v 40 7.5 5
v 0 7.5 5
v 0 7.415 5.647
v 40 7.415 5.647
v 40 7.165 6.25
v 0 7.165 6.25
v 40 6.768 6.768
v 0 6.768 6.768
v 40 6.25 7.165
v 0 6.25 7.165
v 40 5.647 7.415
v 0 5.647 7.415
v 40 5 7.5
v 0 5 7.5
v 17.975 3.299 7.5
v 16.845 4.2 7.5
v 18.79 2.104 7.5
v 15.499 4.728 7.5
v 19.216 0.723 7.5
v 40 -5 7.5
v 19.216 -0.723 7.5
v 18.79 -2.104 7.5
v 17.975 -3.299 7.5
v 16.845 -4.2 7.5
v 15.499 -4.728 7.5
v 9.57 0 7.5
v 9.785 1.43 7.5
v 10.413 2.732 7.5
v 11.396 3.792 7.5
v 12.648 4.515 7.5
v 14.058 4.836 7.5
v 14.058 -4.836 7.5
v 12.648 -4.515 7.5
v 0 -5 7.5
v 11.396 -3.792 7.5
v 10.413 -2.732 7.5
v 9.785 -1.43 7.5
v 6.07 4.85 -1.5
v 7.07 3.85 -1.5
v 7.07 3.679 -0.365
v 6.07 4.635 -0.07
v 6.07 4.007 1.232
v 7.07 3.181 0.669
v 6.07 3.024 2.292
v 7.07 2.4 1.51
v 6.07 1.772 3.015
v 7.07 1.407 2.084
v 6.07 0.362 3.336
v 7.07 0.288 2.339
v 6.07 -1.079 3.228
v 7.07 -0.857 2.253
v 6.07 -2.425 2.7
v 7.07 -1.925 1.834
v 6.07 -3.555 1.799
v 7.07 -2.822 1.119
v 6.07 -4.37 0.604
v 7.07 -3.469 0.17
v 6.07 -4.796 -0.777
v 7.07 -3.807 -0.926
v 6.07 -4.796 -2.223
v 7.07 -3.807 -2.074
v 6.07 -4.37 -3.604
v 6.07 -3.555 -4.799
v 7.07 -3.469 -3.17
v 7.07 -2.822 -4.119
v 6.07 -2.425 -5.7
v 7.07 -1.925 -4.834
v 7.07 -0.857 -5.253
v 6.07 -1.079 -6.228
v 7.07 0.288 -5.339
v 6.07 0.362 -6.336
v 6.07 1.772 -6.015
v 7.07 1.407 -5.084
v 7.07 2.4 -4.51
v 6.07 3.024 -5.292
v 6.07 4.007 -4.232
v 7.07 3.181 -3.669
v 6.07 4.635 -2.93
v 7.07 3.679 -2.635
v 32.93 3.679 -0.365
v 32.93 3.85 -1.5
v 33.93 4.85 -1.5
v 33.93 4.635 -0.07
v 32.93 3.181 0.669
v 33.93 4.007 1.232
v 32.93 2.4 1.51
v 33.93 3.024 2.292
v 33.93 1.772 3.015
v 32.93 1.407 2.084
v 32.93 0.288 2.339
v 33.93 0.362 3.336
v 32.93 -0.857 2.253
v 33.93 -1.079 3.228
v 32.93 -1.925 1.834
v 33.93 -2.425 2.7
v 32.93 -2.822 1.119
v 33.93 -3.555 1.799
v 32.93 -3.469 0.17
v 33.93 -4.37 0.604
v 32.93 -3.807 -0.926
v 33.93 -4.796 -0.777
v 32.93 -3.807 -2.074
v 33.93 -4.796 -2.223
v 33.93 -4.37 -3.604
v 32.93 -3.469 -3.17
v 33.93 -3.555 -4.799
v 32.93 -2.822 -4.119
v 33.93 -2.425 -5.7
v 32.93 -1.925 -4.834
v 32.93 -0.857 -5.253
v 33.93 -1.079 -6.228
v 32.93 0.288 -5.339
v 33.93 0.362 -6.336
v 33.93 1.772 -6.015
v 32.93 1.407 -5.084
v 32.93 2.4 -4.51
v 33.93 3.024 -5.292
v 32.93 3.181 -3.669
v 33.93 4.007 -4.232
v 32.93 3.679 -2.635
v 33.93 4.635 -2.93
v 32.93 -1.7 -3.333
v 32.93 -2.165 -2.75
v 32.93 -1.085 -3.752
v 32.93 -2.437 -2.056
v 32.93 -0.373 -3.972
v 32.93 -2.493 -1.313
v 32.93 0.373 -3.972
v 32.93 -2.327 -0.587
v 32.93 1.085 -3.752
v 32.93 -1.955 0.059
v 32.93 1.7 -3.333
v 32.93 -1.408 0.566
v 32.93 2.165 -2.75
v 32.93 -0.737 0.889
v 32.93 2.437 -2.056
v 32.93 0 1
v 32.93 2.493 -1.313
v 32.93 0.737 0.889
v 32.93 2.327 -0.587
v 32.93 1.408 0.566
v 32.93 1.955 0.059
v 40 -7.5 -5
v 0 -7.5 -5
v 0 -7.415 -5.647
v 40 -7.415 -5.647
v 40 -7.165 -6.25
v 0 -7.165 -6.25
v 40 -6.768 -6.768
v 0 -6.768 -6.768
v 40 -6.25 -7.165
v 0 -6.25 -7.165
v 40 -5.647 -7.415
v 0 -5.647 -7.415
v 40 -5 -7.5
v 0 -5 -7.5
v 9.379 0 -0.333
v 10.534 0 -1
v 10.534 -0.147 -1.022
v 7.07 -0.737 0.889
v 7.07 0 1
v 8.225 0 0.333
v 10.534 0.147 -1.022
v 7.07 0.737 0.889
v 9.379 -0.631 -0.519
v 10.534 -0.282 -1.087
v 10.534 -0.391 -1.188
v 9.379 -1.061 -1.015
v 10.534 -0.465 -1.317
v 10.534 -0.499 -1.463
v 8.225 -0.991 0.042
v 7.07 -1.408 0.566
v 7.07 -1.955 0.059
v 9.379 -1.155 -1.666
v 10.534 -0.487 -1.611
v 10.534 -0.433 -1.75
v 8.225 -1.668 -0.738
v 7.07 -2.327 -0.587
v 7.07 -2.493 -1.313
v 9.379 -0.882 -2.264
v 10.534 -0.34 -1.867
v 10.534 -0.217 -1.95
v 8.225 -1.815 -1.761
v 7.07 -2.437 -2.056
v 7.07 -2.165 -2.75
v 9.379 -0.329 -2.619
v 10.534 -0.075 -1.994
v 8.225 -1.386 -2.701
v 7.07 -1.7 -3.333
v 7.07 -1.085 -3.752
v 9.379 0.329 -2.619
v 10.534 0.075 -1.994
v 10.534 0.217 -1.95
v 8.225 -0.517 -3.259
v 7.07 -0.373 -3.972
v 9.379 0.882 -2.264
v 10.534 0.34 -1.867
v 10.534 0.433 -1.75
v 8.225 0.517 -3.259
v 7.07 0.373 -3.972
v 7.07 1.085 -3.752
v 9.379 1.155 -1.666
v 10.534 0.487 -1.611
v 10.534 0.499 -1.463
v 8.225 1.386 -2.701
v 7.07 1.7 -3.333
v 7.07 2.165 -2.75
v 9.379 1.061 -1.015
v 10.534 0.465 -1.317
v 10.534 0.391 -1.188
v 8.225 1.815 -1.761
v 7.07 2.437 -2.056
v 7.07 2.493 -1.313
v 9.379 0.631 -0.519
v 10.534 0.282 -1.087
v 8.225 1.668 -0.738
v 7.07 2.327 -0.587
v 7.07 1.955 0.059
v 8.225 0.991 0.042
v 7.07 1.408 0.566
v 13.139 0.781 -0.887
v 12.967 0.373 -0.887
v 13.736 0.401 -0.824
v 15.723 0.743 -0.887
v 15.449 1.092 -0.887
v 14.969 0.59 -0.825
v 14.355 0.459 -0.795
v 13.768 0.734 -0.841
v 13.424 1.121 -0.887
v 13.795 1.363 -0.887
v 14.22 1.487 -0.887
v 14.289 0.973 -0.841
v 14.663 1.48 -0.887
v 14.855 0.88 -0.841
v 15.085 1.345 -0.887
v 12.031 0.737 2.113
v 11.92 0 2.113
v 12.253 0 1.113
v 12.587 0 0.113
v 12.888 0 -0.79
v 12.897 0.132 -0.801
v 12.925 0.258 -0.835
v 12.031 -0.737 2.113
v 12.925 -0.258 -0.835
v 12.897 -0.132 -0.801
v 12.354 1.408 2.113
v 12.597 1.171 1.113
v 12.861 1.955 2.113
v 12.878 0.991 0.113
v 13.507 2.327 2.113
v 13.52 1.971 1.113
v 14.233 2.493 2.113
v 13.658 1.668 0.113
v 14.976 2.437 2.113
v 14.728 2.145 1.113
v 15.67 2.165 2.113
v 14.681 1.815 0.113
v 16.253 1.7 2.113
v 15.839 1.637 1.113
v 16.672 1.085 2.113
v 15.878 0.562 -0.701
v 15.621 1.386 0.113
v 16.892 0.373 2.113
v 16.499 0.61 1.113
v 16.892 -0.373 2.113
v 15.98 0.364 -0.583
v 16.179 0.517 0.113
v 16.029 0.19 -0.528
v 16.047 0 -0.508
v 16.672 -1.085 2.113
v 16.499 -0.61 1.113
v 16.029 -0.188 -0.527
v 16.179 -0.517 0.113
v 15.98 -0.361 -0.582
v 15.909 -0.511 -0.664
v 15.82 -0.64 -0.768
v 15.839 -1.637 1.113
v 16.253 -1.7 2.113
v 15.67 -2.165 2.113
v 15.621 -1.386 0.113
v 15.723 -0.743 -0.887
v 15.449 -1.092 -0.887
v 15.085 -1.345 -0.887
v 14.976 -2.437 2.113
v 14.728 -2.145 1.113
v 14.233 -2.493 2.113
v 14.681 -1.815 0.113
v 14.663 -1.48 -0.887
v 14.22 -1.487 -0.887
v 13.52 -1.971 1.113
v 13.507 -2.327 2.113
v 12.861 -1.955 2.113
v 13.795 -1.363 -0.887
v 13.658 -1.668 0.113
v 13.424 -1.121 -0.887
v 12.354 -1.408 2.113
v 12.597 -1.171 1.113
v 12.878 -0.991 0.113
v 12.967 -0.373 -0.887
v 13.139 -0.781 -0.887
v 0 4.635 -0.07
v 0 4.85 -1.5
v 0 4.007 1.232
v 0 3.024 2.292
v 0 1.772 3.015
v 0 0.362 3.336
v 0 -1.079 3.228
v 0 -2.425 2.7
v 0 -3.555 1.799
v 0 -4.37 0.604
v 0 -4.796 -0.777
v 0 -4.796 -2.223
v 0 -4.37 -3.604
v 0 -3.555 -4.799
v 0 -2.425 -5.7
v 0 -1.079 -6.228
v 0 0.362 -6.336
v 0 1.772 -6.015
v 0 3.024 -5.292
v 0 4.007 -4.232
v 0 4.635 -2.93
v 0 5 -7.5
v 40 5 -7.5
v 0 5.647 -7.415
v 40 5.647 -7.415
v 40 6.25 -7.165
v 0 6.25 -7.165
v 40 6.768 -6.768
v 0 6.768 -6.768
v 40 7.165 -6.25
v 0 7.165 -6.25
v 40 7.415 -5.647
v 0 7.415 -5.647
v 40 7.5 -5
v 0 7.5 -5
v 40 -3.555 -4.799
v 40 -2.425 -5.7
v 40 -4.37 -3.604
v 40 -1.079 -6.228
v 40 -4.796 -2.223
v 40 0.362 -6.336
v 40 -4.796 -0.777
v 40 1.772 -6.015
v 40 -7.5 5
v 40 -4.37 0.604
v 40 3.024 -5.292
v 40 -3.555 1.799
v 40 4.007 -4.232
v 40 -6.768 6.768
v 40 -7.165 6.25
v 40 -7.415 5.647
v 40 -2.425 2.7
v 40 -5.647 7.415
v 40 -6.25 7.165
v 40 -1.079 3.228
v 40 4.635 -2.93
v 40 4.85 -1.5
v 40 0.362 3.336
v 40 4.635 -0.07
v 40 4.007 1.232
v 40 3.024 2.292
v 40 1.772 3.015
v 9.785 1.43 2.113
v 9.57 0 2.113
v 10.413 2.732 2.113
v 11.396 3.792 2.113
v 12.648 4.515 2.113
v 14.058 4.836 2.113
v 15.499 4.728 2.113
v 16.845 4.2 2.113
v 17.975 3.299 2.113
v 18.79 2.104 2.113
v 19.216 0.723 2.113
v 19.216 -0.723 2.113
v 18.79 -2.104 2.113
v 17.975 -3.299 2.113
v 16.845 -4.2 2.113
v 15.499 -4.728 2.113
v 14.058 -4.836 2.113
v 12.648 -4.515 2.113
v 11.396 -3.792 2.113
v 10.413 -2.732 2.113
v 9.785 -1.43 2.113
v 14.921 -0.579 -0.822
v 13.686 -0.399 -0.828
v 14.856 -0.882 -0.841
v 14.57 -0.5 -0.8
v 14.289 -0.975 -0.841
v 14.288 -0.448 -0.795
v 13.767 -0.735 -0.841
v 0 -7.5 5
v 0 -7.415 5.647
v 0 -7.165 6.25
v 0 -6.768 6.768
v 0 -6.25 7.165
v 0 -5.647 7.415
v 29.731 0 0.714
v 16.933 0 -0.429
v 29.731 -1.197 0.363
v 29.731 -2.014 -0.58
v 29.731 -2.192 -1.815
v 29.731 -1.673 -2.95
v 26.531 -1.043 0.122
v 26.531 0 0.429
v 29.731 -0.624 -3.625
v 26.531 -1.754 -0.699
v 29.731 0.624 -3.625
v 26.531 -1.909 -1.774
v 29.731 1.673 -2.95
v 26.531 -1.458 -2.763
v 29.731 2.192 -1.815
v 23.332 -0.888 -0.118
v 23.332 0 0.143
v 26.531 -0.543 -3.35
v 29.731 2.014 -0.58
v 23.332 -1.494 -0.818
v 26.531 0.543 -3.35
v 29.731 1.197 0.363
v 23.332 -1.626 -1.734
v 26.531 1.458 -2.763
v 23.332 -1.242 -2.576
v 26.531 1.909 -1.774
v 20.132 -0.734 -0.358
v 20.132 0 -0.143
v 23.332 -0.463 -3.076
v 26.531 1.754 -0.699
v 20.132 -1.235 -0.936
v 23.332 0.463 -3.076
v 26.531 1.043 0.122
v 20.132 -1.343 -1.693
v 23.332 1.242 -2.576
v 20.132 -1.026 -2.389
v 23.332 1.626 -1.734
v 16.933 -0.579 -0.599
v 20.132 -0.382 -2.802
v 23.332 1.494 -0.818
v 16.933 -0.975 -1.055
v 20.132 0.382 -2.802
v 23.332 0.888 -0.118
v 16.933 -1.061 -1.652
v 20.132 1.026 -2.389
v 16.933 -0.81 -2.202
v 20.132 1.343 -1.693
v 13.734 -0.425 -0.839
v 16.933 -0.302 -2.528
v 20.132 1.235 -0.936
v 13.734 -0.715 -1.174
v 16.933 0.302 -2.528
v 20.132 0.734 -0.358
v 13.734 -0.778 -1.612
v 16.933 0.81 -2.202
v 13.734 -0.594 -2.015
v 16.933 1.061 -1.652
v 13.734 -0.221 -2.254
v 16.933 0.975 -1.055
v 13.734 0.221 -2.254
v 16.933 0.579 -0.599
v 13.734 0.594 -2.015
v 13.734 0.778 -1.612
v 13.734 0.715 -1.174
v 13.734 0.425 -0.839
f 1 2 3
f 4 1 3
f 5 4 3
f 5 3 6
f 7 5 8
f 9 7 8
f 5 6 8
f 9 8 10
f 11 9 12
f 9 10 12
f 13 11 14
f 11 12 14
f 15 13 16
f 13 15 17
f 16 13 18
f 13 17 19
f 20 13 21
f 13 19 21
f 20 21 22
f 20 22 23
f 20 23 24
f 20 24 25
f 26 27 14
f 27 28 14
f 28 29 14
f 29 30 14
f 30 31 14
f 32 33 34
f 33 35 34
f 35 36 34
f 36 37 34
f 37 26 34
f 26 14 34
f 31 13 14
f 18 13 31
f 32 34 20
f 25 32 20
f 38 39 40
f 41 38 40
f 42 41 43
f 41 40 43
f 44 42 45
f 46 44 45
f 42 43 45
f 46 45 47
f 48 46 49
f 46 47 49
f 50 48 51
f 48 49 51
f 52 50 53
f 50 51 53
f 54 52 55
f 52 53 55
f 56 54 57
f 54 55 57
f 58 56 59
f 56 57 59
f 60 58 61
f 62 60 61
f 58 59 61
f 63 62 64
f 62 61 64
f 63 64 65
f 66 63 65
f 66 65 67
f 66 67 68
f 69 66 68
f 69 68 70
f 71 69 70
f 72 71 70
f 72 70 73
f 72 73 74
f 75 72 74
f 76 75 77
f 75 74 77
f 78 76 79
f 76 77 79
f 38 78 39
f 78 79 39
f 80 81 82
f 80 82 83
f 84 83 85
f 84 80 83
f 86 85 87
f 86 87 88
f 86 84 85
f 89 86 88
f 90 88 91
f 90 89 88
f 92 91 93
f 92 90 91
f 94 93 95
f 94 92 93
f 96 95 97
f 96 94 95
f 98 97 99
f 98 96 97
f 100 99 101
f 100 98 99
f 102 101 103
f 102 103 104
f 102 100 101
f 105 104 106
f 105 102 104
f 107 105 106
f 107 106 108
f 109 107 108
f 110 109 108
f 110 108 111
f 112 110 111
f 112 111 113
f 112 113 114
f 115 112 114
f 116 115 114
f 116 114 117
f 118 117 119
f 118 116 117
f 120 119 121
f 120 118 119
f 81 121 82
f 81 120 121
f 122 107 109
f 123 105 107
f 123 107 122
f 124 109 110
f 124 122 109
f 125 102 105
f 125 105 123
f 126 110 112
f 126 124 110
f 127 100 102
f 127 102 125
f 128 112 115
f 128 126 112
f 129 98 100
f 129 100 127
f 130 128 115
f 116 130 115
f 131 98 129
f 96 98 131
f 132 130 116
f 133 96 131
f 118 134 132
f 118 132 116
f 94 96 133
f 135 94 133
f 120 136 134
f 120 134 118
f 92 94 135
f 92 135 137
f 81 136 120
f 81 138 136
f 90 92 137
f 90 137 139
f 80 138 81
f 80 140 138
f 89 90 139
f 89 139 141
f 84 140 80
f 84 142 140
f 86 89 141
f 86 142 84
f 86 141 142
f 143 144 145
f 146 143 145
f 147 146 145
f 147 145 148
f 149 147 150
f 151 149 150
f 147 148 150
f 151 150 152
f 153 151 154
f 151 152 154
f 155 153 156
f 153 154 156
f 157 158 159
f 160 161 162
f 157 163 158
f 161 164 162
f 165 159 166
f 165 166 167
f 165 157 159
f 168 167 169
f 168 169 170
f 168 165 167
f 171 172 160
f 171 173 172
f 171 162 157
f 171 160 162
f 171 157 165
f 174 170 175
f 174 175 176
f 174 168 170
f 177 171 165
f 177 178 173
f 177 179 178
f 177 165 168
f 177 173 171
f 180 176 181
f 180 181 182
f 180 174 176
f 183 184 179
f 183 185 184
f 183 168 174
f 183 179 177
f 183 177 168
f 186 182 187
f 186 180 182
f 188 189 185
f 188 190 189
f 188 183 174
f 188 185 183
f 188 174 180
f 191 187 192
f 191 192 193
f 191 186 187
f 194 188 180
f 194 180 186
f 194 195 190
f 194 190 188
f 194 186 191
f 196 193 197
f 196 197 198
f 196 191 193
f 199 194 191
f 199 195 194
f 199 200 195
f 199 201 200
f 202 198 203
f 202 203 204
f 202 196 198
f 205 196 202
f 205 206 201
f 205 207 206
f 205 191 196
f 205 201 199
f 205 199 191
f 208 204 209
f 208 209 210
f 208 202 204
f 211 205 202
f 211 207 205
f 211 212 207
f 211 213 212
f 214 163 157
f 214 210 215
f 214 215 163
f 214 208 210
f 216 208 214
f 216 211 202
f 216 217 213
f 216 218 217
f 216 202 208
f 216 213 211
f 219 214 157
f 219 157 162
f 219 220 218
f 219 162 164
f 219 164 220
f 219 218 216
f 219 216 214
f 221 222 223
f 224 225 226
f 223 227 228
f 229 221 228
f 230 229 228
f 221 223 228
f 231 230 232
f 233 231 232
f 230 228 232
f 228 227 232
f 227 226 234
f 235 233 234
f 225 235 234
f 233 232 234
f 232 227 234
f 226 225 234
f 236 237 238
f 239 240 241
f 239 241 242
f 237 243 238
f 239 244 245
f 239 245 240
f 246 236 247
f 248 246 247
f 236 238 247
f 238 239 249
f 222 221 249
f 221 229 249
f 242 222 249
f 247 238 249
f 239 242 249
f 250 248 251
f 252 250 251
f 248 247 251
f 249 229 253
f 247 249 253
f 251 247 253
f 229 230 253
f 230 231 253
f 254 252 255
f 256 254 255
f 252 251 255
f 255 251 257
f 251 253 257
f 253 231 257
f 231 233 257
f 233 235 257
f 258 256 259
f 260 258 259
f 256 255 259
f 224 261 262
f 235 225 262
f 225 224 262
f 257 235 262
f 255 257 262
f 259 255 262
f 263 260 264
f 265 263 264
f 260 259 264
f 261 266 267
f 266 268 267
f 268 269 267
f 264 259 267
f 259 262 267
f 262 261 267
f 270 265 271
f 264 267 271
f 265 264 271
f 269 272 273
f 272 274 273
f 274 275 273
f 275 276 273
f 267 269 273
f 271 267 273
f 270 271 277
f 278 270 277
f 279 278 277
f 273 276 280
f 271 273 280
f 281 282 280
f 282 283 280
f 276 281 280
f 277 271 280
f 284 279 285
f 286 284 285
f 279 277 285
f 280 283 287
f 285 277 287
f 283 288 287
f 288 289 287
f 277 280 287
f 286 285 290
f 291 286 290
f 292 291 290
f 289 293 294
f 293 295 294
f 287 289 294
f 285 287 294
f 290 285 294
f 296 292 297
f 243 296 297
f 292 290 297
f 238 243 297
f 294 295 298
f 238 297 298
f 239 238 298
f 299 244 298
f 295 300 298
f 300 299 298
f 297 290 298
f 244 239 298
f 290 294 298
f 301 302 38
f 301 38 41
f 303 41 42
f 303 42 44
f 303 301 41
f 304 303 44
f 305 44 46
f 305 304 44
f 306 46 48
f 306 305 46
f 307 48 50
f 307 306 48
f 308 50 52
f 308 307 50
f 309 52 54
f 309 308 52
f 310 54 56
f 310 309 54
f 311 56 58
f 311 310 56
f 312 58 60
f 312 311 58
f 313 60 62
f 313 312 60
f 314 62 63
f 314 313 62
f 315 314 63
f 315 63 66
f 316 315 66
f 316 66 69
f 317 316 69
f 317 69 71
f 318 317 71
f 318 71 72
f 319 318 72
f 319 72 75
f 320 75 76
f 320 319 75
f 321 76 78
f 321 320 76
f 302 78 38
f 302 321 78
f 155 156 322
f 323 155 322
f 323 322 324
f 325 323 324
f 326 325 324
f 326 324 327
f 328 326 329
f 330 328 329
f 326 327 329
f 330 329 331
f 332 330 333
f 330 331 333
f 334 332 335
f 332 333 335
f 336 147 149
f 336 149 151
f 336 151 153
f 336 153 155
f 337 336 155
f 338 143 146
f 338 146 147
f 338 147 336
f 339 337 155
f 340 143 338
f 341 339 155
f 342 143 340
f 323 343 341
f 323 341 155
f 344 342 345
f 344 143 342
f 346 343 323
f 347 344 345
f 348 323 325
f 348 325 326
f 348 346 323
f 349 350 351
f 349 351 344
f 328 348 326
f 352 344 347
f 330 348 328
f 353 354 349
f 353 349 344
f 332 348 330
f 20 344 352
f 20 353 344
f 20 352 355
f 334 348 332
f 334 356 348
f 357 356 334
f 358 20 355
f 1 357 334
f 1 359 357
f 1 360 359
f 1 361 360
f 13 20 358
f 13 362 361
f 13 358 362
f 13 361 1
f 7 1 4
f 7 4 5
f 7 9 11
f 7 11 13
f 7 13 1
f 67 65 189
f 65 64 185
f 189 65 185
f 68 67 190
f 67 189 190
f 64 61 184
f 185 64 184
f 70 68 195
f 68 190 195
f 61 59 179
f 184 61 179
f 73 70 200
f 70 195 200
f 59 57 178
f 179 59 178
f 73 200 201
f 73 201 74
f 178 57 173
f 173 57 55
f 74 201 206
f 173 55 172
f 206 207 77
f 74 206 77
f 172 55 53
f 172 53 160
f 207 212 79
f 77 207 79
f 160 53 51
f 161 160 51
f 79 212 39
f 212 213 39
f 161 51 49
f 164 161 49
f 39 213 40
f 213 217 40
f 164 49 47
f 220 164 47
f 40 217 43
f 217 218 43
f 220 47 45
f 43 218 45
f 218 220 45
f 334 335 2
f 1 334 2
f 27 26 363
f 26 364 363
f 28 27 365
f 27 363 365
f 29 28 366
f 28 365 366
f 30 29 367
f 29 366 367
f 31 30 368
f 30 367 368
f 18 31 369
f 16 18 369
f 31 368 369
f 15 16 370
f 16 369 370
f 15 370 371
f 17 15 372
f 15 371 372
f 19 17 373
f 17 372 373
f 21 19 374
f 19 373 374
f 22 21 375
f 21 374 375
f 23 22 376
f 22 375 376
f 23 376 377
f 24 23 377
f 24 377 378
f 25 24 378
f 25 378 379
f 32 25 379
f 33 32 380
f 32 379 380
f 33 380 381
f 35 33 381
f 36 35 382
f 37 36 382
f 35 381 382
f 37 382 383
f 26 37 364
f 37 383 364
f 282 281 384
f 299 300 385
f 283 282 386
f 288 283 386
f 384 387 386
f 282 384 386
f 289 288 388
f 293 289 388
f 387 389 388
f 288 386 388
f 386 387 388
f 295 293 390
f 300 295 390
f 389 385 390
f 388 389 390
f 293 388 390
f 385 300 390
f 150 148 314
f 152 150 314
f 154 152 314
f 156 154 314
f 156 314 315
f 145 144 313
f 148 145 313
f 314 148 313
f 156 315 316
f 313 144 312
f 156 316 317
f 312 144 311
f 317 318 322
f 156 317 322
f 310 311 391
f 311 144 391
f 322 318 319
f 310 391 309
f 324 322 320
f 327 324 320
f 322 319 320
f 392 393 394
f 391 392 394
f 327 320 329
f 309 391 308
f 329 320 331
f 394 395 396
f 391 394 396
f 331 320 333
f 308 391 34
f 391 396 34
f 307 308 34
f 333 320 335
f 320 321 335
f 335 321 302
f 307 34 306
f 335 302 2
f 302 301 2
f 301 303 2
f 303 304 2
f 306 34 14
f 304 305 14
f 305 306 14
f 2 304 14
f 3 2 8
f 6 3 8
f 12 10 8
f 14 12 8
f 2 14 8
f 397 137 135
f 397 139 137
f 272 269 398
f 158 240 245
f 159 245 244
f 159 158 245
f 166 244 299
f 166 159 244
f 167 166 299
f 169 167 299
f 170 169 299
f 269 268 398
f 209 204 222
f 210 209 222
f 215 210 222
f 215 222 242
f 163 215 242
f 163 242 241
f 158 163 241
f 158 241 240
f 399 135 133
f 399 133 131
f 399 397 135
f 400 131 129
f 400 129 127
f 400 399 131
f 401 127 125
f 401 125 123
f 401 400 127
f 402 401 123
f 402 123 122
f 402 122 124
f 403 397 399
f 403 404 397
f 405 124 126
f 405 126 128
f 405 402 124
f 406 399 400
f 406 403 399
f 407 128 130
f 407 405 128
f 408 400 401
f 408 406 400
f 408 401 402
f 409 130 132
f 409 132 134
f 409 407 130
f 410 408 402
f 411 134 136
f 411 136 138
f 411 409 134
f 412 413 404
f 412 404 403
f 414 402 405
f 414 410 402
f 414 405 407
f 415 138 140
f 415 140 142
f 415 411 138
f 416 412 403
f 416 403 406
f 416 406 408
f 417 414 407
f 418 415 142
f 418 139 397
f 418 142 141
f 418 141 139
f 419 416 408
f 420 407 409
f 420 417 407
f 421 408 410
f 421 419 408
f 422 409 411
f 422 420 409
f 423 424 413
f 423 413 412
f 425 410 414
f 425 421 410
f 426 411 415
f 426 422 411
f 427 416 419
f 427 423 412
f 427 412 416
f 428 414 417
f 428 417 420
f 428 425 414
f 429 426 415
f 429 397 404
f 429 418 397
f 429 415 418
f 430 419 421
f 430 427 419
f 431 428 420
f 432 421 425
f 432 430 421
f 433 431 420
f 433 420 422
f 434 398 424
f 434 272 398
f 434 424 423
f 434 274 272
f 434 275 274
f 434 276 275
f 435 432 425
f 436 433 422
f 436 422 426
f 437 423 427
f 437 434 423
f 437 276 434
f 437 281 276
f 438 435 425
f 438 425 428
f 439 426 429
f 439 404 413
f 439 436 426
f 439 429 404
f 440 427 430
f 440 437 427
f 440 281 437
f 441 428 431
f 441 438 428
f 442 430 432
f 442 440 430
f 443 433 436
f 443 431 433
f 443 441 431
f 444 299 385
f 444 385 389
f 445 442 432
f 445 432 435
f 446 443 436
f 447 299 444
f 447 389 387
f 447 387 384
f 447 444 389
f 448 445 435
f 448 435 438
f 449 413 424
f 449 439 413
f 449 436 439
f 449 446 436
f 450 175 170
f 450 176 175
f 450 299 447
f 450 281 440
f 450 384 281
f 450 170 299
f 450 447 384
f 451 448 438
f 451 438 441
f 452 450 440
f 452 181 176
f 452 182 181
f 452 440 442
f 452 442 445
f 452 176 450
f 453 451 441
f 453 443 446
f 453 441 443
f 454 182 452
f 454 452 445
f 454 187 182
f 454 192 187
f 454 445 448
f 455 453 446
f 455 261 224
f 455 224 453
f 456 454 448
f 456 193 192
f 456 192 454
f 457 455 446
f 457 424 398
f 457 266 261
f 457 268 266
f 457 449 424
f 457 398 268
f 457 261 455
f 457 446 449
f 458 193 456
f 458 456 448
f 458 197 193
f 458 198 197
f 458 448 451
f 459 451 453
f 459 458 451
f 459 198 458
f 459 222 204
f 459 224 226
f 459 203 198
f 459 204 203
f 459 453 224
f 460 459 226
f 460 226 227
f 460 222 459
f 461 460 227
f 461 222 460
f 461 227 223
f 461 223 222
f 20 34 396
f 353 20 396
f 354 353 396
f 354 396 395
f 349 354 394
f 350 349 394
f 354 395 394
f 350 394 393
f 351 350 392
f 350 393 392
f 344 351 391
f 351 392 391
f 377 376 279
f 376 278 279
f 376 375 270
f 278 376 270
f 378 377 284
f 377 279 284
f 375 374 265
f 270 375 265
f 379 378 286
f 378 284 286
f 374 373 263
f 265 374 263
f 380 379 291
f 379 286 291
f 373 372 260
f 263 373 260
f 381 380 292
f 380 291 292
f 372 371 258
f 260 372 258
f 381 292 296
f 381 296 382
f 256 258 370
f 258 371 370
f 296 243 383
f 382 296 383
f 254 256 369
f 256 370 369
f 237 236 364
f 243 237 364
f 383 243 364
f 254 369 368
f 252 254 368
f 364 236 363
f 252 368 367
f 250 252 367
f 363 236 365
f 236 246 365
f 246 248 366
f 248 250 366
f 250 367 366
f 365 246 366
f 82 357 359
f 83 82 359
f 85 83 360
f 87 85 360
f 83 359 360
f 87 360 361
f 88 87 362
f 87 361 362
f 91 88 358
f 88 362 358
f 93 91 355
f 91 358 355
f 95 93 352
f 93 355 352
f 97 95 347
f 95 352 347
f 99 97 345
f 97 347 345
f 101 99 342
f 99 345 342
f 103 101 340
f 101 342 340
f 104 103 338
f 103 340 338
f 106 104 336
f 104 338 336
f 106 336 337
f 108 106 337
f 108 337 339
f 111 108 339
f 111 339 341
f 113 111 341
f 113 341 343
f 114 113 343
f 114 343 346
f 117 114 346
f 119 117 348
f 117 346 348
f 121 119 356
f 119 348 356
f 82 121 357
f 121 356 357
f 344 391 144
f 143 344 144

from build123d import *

# Parameters (mm, degrees)
F1_DEPTH = 40
F2_R     = 4.85
F3_DEPTH = 7.07
F4_R     = 4.85
F5_DEPTH = 7.07
F10_SIZE = 1


# Not quite as in the source:
# - a feature names something its author has since deleted; it is built from what else it names


with BuildPart() as f1:
    # F0 (on Right) → F1 (new body)
    with BuildSketch(Plane.YZ):
        with BuildLine():
            ThreePointArc((7.5, 5), (6.767766953, 6.767766953), (5, 7.5))
            Line((5, 7.5), (-5, 7.5))
            ThreePointArc((-5, 7.5), (-6.767766953, 6.767766953), (-7.5, 5))
            Line((-7.5, 5), (-7.5, -5))
            ThreePointArc((-7.5, -5), (-6.767766953, -6.767766953), (-5, -7.5))
            Line((-5, -7.5), (5, -7.5))
            ThreePointArc((5, -7.5), (6.767766953, -6.767766953), (7.5, -5))
            Line((7.5, -5), (7.5, 5))
        make_face()
    extrude(amount=F1_DEPTH)

    # F2 (on face) → F3 (cut)
    with BuildSketch(Plane.YZ.offset(40)):
        with Locations((0, -1.5)):
            Circle(F2_R)
    extrude(amount=-F3_DEPTH, mode=Mode.SUBTRACT)

    # F4 (on face) → F5 (cut)
    with BuildSketch(Plane.YZ):
        with Locations((0, -1.5)):
            Circle(F4_R)
    extrude(amount=F5_DEPTH, mode=Mode.SUBTRACT)

    # F6 (on Front) → F7 (revolve, cut)
    with BuildSketch(Plane.XZ):
        Polygon((32.93, -1.5), (32.93, 1), (10.5341016151, -1), (7.07, 1), (7.07, -1.5), align=None)
    revolve(axis=Axis((20, 0, -1.5), (1, 0, 0)), mode=Mode.SUBTRACT)

    # F8 (on Front) → F9 (revolve, cut)
    with BuildSketch(Plane.XZ):
        Polygon((9.57, 2.1126677044), (11.92, 2.1126677044), (14.42, 2.1126677044), (14.42, 9.1826677044), (9.57, 9.1826677044), align=None)
        Polygon((14.42, 2.1126677044), (11.92, 2.1126677044), (12.92, -0.8873322956), (14.42, -0.7533791963), align=None)
    revolve(axis=Axis((14.42, 0, 2.2679000954), (0, 0, -1)), mode=Mode.SUBTRACT)

    # F10
    f10_edges = [f1.edges().sort_by_distance(p)[0] for p in [
        (32.93, -4.85, -1.5),
        (7.07, -4.85, -1.5),
    ]]
    chamfer(f10_edges, length=F10_SIZE)


solid = f1.part
